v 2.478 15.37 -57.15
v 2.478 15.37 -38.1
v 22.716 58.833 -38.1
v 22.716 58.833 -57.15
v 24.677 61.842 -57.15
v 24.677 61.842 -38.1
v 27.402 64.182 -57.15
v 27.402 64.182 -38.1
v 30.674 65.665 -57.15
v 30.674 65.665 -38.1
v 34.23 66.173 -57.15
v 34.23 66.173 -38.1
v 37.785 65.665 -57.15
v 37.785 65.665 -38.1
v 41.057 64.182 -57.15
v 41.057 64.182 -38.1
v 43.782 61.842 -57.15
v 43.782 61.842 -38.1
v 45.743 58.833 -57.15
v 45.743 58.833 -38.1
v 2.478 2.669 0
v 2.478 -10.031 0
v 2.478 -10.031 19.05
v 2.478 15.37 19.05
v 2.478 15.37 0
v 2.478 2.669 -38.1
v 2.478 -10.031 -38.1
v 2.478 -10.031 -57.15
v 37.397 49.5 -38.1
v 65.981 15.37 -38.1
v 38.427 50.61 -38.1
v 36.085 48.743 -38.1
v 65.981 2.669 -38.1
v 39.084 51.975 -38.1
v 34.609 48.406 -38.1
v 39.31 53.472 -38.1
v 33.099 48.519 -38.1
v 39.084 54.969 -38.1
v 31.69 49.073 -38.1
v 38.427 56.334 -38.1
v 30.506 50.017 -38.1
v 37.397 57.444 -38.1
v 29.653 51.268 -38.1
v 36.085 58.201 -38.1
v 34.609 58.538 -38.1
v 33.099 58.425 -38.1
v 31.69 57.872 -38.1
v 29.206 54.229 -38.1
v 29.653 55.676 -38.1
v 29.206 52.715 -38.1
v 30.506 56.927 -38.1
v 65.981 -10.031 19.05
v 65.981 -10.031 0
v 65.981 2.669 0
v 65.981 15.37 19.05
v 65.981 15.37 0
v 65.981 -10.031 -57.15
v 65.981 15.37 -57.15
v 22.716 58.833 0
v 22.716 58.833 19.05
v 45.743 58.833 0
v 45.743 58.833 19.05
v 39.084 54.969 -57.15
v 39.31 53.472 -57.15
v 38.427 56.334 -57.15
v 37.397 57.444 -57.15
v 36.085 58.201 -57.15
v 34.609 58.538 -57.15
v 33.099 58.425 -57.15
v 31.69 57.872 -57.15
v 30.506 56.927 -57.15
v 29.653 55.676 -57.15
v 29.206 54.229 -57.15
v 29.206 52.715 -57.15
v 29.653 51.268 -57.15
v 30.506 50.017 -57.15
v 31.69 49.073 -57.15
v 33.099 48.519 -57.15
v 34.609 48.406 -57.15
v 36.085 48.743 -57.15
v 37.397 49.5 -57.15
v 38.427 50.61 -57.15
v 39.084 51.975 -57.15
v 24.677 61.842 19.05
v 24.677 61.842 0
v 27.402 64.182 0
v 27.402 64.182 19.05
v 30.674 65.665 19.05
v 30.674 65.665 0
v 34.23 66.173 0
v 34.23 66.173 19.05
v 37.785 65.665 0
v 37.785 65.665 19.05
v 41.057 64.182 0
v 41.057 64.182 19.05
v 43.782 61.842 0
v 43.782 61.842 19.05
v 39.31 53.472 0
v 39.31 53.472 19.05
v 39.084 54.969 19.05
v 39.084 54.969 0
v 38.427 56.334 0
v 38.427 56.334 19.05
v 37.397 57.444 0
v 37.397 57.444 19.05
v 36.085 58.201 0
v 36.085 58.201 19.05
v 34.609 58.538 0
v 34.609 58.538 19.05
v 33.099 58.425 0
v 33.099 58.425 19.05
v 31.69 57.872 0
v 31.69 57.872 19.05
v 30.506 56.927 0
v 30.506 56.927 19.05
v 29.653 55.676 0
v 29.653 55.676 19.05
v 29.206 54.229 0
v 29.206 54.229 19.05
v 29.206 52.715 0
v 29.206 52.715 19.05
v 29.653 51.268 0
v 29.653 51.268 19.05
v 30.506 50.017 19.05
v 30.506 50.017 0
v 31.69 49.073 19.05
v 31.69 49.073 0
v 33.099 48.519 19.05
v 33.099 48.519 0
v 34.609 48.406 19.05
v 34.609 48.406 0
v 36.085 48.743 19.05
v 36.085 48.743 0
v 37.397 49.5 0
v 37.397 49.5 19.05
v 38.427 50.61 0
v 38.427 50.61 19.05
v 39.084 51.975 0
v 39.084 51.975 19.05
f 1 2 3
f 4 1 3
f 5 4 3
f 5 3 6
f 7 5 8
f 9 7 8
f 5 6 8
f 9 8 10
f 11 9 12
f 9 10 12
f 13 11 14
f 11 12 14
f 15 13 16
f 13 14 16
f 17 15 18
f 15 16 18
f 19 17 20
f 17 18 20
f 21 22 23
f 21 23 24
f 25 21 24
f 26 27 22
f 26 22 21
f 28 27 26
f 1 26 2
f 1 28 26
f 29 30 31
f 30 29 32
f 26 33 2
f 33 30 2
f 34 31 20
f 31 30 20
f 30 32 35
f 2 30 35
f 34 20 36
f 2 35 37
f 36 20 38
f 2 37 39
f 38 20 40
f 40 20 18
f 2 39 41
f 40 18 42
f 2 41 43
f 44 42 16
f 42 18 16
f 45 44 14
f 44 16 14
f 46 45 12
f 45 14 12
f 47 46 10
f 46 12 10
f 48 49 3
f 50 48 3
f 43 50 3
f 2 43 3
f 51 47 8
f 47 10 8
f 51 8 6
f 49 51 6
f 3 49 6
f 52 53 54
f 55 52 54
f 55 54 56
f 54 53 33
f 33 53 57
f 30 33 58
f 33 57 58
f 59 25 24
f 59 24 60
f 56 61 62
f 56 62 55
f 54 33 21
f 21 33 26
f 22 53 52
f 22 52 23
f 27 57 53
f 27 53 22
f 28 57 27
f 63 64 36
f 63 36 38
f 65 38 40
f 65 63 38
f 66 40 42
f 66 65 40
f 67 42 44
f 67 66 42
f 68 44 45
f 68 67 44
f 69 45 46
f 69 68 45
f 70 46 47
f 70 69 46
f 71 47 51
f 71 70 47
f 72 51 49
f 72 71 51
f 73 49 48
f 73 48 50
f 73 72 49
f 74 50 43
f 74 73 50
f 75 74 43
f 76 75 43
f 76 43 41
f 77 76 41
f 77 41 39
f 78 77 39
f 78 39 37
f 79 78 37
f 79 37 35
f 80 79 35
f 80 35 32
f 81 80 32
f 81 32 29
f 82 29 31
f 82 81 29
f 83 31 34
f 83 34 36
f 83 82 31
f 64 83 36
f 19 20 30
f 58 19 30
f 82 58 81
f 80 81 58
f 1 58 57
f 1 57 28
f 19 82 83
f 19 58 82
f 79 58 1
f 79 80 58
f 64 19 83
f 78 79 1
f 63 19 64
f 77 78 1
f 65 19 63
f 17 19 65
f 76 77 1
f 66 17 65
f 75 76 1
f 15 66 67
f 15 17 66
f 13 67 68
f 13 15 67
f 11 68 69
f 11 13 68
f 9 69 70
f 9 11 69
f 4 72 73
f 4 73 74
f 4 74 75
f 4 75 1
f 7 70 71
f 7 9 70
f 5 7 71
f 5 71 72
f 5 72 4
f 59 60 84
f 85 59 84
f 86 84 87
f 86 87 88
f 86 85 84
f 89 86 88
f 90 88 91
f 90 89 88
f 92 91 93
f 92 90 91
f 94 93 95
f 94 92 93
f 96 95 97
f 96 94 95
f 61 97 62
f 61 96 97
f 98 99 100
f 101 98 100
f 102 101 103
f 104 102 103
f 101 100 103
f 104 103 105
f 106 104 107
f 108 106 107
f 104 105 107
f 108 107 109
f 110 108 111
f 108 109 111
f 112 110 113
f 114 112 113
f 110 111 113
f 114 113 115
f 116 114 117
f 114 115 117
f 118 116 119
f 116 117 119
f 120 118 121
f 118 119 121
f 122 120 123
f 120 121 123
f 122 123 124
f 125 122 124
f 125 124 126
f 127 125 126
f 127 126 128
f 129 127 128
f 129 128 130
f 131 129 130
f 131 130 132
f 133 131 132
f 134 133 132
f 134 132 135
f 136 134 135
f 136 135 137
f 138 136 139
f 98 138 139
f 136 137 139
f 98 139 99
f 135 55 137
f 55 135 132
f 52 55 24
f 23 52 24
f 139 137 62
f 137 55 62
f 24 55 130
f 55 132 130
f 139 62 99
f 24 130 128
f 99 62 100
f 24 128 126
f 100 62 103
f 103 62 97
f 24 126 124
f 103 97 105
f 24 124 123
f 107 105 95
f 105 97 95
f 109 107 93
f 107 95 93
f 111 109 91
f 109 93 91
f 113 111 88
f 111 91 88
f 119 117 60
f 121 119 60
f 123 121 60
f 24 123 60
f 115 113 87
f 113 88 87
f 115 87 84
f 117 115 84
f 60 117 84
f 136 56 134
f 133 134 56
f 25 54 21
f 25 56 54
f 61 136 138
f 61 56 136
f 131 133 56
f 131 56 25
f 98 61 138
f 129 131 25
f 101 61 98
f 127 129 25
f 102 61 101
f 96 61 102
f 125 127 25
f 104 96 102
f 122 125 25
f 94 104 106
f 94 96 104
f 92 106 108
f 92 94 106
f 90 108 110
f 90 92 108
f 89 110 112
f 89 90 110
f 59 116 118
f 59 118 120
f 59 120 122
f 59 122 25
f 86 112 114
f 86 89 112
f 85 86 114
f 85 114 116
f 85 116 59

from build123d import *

# Parameters (mm, degrees)
BOSS_EXTRUDE2_DEPTH = 19.05
SKETCH3_R           = 5.08
CUT_EXTRUDE1_DEPTH  = 19.05
SKETCH5_W           = 63.503429877
SKETCH5_H           = 12.7
BOSS_EXTRUDE3_DEPTH = 19.05


with BuildPart() as part:
    # Sketch2 → Boss-Extrude2 (new body)
    with BuildSketch(Plane.XY):
        with BuildLine():
            Line((2.477787128, -10.031332986), (2.477787128, 15.370038965))
            Line((2.477787128, 15.370038965), (22.715808333, 58.833279677))
            ThreePointArc((22.715808333, 58.833279677), (34.229502066, 66.172782867), (45.7431958, 58.833279677))
            Line((45.7431958, 58.833279677), (65.981217005, 15.370038965))
            Line((65.981217005, 15.370038965), (65.981217005, -10.031332986))
            Line((65.981217005, -10.031332986), (2.477787128, -10.031332986))
        make_face()
    boss_extrude2 = extrude(amount=BOSS_EXTRUDE2_DEPTH)

    # Sketch3 → Cut-Extrude1 (cut)
    with BuildSketch(Plane.XY.offset(19.05)):
        with Locations((34.229502066, 53.472096891)):
            Circle(SKETCH3_R)
    cut_extrude1 = extrude(amount=-CUT_EXTRUDE1_DEPTH, mode=Mode.SUBTRACT)

    # Sketch5 → Boss-Extrude3 (add)
    with BuildSketch(Plane(origin=(0, 0, 0), x_dir=(-1, 0, 0), z_dir=(0, 0, -1))):
        with Locations((-34.229502067, -3.681332986)):
            Rectangle(SKETCH5_W, SKETCH5_H)
    boss_extrude3 = extrude(amount=BOSS_EXTRUDE3_DEPTH)

    # Mirror1: Boss-Extrude2, Cut-Extrude1, Boss-Extrude3 across plane
    add(boss_extrude2.mirror(Plane.XY.offset(-19.05)))
    add(cut_extrude1.mirror(Plane.XY.offset(-19.05)), mode=Mode.SUBTRACT)
    add(boss_extrude3.mirror(Plane.XY.offset(-19.05)))


solid = part.part
